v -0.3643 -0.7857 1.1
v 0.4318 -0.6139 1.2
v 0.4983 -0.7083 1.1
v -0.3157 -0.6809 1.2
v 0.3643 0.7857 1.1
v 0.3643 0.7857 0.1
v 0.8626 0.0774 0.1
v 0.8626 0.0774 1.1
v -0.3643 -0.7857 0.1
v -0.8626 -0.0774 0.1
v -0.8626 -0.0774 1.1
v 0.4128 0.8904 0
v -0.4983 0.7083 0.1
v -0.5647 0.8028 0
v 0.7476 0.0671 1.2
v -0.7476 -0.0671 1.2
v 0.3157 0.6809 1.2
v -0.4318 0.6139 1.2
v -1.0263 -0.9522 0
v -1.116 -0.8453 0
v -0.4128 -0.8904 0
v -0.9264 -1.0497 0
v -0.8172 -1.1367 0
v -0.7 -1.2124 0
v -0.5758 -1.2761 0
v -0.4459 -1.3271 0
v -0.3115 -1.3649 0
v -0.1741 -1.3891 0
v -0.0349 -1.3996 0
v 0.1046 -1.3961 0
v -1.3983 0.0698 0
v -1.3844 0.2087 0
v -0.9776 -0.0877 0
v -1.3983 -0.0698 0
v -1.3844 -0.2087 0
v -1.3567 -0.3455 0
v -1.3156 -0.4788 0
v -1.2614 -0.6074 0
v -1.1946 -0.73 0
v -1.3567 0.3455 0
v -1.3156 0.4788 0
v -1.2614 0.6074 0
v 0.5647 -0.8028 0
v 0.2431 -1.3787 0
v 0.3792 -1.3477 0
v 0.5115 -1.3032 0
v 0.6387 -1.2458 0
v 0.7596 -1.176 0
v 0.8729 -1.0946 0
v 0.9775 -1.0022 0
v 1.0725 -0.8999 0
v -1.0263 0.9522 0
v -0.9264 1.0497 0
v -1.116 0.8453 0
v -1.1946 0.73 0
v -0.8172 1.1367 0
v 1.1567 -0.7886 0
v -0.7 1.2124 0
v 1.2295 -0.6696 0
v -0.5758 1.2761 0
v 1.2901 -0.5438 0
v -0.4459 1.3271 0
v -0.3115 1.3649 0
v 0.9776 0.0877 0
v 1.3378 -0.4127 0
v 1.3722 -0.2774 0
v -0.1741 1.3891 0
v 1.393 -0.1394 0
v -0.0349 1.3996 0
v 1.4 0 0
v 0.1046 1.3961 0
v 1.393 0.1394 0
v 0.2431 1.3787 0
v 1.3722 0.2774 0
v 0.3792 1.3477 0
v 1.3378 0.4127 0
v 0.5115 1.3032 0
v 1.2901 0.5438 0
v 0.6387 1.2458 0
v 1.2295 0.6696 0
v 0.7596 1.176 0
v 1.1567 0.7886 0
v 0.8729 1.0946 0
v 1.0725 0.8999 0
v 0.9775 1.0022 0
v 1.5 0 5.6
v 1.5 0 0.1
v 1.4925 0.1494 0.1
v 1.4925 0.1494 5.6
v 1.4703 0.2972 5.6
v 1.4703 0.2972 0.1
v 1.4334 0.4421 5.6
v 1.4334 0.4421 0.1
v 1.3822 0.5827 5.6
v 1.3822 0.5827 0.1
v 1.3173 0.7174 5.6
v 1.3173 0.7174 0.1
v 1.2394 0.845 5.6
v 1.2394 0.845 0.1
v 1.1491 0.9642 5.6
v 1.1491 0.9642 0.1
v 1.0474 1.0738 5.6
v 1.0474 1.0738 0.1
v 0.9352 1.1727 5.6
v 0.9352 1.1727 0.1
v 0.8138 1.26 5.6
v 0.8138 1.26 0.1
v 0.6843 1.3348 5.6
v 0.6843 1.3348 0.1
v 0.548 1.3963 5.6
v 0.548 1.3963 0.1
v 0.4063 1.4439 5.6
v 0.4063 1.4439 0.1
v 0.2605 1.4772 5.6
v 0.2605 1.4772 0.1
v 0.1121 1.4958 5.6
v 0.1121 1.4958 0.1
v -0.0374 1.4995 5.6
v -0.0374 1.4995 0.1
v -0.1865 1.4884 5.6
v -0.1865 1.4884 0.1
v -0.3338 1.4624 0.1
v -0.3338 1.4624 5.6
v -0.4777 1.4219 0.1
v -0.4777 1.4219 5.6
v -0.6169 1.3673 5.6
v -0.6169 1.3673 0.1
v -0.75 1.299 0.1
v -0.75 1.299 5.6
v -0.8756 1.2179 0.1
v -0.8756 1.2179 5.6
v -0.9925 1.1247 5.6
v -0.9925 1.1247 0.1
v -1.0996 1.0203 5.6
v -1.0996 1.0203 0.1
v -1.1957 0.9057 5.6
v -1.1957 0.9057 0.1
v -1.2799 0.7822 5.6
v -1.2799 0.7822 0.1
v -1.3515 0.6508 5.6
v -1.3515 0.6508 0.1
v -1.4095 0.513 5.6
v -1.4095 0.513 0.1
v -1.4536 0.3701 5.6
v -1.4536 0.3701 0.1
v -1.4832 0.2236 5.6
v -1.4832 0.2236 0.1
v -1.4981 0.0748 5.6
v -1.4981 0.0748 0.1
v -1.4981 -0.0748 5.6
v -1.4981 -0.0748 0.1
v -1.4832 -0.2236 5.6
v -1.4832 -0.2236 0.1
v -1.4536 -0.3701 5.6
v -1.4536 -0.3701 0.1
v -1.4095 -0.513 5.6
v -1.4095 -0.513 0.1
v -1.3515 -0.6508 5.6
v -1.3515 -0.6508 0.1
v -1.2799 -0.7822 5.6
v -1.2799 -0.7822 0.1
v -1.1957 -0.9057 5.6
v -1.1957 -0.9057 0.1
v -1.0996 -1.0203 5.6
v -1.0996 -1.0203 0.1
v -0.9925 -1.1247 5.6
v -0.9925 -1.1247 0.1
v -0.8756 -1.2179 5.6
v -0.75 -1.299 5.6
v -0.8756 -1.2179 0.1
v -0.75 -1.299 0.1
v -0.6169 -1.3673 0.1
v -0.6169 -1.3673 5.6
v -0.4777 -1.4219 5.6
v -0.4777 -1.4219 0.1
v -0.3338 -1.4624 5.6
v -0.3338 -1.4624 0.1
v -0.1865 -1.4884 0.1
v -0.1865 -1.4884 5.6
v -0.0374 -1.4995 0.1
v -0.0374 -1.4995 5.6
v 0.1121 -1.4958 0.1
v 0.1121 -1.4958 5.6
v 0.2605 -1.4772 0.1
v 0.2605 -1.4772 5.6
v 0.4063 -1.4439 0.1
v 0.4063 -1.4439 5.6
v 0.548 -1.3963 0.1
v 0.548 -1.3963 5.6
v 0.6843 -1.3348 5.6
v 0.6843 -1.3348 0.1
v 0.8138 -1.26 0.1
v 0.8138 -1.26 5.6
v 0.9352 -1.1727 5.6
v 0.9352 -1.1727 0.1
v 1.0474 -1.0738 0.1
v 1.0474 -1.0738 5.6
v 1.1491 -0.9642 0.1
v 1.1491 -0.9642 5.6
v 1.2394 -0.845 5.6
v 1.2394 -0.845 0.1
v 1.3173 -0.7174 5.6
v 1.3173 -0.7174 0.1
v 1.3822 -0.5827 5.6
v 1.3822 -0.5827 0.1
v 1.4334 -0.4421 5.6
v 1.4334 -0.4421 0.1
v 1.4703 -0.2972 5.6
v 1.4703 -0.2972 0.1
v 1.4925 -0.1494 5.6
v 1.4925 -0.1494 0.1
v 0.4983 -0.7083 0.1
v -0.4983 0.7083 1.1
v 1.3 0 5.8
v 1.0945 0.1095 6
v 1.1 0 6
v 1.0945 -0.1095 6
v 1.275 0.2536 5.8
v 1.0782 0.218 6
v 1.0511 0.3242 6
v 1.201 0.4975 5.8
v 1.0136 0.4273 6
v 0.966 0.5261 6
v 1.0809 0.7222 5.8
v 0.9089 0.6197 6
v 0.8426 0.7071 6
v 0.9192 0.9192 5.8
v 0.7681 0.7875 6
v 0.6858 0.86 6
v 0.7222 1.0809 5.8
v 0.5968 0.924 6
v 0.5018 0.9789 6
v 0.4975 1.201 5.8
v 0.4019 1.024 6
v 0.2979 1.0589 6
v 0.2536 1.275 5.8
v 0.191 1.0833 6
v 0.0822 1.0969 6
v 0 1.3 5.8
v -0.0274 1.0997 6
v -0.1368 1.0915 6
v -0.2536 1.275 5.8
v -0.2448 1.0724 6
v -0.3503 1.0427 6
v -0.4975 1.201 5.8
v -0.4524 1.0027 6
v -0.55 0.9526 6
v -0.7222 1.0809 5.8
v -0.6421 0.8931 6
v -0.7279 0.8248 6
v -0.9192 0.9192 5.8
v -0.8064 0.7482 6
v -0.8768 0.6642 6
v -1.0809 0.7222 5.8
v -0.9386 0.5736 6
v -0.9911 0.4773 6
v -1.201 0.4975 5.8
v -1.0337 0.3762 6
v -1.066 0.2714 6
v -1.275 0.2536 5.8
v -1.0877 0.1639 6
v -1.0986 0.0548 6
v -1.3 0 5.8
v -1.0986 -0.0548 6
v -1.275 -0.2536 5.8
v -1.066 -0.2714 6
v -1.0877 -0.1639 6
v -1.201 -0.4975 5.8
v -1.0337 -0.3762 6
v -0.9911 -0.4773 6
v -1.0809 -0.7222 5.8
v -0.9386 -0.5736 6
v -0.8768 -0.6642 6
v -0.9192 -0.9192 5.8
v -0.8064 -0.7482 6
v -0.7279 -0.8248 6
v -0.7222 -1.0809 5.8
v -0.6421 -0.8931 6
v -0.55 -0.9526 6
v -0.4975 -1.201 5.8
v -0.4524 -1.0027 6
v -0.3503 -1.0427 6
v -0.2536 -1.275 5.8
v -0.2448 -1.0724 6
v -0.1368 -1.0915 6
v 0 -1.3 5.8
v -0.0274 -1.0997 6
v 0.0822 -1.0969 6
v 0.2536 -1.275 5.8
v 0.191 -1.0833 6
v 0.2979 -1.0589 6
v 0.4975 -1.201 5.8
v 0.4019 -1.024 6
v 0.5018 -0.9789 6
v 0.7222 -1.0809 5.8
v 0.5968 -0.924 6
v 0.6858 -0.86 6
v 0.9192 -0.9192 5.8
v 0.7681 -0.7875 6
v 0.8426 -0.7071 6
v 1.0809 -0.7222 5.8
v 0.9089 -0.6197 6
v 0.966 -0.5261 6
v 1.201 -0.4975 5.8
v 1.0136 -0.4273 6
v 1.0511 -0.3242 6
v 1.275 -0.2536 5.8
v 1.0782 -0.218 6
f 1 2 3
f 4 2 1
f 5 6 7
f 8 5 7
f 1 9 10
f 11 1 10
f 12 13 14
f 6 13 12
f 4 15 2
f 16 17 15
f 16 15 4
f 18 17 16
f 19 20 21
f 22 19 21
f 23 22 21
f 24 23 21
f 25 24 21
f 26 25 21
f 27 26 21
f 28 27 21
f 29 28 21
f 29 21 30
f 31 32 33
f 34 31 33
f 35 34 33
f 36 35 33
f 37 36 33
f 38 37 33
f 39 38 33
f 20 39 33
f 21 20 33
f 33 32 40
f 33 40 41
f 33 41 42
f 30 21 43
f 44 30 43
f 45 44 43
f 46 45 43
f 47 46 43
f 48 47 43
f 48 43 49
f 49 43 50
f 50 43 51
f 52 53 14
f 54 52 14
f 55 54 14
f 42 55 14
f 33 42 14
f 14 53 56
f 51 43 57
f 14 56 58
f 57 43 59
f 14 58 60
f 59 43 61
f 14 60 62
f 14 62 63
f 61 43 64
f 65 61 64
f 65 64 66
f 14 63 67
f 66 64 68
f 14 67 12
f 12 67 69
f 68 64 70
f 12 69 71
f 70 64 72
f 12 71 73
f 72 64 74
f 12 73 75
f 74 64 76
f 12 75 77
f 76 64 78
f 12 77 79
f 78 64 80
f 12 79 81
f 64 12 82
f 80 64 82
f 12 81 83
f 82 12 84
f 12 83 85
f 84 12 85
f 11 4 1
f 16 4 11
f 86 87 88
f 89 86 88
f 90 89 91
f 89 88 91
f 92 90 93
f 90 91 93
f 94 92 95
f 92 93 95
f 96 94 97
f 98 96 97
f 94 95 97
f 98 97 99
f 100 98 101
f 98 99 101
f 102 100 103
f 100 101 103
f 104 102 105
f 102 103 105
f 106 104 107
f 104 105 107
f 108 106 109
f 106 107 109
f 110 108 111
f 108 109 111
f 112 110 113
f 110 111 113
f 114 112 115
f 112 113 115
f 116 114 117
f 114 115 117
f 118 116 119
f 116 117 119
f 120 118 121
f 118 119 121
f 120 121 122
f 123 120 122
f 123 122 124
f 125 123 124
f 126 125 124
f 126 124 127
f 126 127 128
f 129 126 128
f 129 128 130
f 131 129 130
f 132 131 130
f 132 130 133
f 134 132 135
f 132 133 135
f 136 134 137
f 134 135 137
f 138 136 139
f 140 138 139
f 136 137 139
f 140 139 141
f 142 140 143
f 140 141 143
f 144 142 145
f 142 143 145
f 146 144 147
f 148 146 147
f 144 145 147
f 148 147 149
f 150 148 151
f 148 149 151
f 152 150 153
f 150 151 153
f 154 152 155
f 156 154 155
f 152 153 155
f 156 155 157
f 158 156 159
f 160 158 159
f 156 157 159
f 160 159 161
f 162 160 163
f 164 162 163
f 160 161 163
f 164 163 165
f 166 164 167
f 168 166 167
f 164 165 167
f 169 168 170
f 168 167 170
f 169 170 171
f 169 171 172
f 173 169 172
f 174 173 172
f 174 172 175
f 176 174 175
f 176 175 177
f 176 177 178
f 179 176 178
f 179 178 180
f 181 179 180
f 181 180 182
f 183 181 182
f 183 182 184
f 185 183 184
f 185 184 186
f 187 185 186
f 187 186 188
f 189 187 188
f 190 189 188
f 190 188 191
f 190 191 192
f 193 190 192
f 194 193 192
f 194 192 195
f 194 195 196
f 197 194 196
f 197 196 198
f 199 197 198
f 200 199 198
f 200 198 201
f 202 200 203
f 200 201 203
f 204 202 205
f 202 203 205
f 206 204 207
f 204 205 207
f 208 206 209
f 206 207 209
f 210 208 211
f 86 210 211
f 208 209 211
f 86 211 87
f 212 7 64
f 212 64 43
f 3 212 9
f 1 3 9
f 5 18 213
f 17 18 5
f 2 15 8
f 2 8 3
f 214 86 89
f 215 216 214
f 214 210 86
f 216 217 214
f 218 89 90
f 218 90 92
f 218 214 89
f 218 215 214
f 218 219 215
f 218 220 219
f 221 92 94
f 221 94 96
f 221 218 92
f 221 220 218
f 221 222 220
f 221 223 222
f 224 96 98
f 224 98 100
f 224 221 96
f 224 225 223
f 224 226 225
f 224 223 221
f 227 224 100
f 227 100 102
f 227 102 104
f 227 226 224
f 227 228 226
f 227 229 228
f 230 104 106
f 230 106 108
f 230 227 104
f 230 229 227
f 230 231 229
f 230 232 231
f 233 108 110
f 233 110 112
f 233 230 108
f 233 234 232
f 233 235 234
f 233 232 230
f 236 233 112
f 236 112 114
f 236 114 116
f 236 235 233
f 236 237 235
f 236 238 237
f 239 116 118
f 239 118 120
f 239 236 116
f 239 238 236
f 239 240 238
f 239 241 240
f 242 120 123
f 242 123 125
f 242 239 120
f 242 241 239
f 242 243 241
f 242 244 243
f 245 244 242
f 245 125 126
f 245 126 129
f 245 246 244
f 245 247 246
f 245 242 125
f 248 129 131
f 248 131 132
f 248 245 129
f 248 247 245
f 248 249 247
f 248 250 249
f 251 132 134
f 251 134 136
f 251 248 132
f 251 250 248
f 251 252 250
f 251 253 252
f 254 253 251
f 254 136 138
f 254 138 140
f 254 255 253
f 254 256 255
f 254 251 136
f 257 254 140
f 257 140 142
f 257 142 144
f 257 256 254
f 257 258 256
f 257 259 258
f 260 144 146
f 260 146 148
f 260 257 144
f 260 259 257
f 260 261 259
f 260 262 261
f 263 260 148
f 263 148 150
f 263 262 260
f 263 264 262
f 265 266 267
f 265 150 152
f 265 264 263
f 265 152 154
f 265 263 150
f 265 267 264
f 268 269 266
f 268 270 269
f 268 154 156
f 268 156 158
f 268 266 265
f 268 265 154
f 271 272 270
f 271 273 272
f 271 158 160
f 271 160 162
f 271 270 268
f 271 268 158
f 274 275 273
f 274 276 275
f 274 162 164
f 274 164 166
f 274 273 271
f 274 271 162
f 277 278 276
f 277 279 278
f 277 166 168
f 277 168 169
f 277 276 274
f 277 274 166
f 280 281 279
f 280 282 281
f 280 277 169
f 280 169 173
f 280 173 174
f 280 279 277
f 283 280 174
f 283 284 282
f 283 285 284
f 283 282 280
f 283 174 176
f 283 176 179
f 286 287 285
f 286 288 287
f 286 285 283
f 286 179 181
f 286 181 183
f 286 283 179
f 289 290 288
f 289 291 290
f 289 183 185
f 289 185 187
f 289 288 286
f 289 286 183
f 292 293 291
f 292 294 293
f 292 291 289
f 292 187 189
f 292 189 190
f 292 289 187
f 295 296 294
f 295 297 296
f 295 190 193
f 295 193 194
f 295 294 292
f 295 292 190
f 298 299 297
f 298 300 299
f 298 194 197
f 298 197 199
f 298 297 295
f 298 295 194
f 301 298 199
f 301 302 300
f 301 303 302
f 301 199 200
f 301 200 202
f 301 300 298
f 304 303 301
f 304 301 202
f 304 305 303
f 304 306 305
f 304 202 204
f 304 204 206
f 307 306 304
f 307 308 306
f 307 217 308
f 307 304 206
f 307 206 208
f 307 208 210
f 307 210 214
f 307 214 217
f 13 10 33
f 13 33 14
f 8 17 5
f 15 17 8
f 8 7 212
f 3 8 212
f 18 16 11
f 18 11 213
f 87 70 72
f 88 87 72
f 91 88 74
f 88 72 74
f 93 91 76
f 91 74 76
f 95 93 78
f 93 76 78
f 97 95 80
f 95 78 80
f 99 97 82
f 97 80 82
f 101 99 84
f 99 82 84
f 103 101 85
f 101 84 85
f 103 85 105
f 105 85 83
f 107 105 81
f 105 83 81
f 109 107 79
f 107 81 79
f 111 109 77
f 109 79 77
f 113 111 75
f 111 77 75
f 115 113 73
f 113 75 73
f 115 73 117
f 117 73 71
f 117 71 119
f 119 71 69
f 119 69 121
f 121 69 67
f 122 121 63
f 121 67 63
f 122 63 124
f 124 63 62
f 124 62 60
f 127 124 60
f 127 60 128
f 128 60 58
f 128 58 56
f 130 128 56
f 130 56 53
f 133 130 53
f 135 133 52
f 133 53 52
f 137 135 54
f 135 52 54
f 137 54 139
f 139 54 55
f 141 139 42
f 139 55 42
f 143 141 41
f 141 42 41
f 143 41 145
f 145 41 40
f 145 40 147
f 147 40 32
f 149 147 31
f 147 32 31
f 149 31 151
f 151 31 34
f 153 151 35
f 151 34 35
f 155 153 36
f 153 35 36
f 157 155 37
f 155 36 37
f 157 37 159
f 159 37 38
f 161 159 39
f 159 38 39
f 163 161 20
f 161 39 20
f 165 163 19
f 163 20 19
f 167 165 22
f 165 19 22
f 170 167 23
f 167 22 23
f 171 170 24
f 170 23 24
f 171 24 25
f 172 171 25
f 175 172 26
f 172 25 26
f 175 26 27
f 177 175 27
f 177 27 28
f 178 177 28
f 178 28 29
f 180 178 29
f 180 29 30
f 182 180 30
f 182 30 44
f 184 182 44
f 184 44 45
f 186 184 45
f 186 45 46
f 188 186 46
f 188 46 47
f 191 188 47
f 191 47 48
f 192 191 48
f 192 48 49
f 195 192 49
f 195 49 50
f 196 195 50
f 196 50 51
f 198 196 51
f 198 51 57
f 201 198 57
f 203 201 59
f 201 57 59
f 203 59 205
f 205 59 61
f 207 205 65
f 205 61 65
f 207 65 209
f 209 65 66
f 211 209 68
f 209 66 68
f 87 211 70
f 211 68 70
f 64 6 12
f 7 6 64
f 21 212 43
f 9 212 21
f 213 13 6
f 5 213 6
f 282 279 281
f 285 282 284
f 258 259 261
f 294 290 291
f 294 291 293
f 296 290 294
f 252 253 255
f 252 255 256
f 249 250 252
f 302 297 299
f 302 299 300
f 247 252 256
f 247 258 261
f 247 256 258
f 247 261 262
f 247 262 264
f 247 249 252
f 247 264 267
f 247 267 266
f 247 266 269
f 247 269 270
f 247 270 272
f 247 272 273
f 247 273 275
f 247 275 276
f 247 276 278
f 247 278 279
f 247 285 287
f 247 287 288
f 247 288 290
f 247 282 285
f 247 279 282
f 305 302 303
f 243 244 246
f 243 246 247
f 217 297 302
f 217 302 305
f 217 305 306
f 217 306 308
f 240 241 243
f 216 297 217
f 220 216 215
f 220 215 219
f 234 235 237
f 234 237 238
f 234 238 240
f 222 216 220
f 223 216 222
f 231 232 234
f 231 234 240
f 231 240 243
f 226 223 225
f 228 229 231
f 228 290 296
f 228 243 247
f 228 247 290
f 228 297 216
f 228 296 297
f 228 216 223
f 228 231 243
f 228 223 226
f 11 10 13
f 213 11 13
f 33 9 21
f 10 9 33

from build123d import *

# Parameters (mm, degrees)
SKETCH_1_R          = 1.5
EXTRUDE_1_DEPTH     = 6
CHAMFER_1_SIZE      = 0.4
CUT_EXTRUDE_1_DEPTH = 1.2
CHAMFER_2_SIZE      = 0.1


with BuildPart() as part:
    # 草图1 → 凸台-拉伸1 (new body)
    with BuildSketch(Plane.XY):
        Circle(SKETCH_1_R)
    extrude(amount=EXTRUDE_1_DEPTH)

    # 倒角1
    chamfer_1_edges = [part.edges().sort_by_distance(p)[0] for p in [
        (-1.5, 0, 6),
    ]]
    chamfer(chamfer_1_edges, length=CHAMFER_1_SIZE)

    # 草图2 → 切除-拉伸1 (cut)
    with BuildSketch(Plane(origin=(0, 0, 0), x_dir=(-1, 0, 0), z_dir=(0, 0, -1))):
        Polygon((0.498286364, 0.708315396), (-0.364275945, 0.785686347), (-0.862562308, 0.077370951), (-0.498286364, -0.708315396), (0.364275945, -0.785686347), (0.862562308, -0.077370951), align=None)
    extrude(amount=-CUT_EXTRUDE_1_DEPTH, mode=Mode.SUBTRACT)

    # 倒角2
    chamfer_2_edges = [part.edges().sort_by_distance(p)[0] for p in [
        (-0.680424336, 0.315472222, 1.2),
        (-0.613419127, -0.431528649, 1.2),
        (0.067005209, -0.747000871, 1.2),
        (0.680424336, -0.315472222, 1.2),
        (0.613419127, 0.431528649, 1.2),
        (-0.067005209, 0.747000871, 1.2),
        (-0.680424336, 0.315472222, 0),
        (-0.067005209, 0.747000871, 0),
        (0.613419127, 0.431528649, 0),
        (0.680424336, -0.315472222, 0),
        (0.067005209, -0.747000871, 0),
        (-0.613419127, -0.431528649, 0),
        (-1.5, 0, 0),
    ]]
    chamfer(chamfer_2_edges, length=CHAMFER_2_SIZE)


solid = part.part
